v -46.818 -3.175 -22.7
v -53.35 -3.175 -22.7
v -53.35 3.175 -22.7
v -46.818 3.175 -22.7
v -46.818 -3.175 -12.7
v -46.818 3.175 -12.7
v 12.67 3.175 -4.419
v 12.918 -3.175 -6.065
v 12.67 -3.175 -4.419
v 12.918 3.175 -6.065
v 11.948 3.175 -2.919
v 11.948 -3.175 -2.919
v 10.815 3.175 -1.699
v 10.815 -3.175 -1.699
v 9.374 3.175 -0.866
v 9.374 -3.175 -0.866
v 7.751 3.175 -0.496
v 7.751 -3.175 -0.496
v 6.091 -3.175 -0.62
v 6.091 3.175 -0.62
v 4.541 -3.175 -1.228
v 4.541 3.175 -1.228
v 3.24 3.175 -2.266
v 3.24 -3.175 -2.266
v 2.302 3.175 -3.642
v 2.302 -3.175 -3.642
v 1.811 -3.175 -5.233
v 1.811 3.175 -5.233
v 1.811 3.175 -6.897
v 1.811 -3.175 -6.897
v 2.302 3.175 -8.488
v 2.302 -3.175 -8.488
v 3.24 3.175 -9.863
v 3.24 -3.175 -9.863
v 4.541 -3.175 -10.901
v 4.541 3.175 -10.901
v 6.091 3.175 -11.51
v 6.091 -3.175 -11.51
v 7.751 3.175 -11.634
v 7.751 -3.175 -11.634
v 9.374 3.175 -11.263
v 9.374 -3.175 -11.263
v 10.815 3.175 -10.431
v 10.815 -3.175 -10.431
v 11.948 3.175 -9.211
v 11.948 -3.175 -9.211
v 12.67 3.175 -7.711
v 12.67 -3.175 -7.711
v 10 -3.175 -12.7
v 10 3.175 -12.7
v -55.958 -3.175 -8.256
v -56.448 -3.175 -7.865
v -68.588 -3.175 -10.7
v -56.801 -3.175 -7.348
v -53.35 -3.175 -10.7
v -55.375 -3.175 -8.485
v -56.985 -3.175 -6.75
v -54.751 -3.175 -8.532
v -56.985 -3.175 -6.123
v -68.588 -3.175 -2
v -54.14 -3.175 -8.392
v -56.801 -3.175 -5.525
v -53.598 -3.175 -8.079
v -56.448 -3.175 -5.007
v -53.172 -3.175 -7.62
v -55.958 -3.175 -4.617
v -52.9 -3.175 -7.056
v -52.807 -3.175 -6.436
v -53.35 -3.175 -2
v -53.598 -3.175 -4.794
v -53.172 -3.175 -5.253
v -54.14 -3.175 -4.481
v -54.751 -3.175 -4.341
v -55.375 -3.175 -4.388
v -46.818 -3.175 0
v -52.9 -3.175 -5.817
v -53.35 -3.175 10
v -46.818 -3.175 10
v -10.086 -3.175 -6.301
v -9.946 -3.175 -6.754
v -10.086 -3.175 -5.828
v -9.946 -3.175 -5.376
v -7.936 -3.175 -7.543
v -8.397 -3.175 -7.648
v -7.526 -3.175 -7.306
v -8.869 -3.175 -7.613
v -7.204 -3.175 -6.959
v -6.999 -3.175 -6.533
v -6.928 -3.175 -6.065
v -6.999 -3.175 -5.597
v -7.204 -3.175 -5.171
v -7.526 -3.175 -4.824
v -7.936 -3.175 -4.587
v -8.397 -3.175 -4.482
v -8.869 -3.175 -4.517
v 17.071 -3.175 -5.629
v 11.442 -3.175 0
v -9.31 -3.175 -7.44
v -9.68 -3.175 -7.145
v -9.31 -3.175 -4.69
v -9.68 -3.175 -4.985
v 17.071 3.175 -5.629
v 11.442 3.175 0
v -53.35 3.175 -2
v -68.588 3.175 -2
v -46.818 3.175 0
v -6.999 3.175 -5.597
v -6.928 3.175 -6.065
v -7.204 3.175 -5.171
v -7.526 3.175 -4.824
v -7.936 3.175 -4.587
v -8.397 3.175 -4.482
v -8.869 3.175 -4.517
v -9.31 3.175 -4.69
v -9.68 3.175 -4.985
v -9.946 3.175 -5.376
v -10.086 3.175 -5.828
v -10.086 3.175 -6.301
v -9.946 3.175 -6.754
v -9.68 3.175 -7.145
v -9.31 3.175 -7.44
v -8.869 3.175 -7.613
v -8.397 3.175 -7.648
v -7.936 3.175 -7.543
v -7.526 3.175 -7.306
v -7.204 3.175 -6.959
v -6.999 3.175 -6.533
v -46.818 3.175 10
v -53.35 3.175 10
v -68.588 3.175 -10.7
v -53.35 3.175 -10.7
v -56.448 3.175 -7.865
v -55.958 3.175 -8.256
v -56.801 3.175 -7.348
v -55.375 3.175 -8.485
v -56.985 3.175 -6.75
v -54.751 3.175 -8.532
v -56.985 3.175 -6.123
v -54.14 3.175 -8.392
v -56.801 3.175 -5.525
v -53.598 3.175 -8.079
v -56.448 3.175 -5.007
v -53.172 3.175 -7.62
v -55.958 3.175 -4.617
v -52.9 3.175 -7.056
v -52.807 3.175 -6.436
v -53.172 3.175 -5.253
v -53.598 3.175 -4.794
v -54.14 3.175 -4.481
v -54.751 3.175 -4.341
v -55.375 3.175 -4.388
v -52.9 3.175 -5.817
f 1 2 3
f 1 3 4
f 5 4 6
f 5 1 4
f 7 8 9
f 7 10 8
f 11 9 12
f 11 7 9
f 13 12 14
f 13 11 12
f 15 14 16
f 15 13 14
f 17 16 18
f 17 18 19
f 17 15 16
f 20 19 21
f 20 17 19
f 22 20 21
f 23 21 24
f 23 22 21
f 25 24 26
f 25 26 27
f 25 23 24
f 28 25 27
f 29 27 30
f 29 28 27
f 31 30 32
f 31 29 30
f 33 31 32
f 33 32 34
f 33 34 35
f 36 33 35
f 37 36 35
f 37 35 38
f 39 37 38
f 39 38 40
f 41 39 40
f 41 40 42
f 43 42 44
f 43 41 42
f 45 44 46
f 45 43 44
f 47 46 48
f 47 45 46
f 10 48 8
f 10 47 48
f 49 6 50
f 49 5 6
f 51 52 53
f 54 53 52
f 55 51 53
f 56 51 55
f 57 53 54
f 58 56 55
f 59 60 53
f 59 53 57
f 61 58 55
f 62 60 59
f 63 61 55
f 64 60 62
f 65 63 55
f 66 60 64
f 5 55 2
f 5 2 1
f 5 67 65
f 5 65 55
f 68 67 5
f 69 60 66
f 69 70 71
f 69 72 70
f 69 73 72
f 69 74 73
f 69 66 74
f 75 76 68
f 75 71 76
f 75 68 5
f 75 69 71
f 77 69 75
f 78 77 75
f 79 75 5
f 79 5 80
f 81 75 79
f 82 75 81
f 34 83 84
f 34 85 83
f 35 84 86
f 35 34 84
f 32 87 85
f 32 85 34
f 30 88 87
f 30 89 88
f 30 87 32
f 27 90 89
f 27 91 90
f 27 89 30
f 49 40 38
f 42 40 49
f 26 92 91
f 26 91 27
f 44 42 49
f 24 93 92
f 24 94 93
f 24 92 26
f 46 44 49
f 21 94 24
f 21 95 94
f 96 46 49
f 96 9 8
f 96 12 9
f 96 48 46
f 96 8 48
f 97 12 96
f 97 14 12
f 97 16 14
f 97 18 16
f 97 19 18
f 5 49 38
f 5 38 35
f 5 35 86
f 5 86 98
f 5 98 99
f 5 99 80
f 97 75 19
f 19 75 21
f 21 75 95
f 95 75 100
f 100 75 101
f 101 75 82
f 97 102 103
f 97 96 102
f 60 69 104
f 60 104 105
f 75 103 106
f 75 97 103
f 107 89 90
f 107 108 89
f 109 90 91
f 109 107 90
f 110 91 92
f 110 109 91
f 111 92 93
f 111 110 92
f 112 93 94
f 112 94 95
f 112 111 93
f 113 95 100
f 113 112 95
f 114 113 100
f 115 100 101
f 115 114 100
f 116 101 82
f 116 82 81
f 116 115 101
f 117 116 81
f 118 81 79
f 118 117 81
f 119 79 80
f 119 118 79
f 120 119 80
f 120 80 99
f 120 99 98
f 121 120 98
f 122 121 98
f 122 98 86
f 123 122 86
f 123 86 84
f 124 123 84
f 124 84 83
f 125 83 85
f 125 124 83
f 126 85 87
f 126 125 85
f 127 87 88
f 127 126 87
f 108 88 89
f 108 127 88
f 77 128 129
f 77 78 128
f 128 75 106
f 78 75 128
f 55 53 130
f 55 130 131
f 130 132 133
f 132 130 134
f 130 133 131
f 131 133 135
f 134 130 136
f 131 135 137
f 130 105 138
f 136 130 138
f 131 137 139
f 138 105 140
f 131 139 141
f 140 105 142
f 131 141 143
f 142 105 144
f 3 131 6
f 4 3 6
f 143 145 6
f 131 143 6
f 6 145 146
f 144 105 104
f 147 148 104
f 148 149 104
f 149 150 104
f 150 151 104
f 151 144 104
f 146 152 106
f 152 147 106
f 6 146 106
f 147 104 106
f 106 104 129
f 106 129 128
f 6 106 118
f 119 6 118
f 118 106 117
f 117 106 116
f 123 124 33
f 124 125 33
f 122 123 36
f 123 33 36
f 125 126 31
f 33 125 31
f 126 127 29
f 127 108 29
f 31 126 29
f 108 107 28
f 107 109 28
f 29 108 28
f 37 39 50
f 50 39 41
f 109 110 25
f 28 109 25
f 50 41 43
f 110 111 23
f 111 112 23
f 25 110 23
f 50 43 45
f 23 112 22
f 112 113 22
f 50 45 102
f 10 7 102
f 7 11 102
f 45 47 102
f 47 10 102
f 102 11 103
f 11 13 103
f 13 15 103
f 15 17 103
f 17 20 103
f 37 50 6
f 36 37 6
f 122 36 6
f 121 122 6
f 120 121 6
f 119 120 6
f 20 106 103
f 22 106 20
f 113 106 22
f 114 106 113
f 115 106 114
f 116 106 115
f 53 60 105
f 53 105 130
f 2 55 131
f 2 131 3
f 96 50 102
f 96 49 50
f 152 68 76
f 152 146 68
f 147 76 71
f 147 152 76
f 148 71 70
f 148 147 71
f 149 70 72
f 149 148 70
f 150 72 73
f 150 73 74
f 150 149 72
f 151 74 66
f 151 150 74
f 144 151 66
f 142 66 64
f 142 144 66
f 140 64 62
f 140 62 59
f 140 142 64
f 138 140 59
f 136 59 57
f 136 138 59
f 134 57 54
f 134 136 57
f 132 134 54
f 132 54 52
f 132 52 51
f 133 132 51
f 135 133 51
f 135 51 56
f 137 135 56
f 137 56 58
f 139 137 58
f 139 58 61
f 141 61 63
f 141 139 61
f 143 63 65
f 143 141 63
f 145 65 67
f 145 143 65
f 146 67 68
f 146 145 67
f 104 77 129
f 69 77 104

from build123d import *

# Parameters (mm, degrees)
F0_R     = 2.101025
F0_R_2   = 1.5875
F0_R_3   = 5.584671
F1_DEPTH = 3.175


with BuildPart() as f1:
    # F0 (on Front) → F1 (new body, symmetric)
    with BuildSketch(Plane.XZ):
        Polygon((-46.817864, -12.7), (-46.817864, 0), (-46.817864, 10), (-53.349793, 10), (-53.349793, -2), (-68.587884, -2), (-68.587884, -10.7), (-53.349793, -10.7), (-53.349793, -22.7), (-46.817864, -22.7), align=None)
        with Locations((-54.907676, -6.436401)):
            Circle(F0_R, mode=Mode.SUBTRACT)
        Polygon((11.442136, 0), (1.442136, 0), (-46.817864, 0), (-46.817864, -12.7), (0, -12.7), (10, -12.7), (17.071068, -5.628932), align=None)
        with Locations((-8.515809, -6.064869)):
            Circle(F0_R_2, mode=Mode.SUBTRACT)
        with Locations((7.333491, -6.064869)):
            Circle(F0_R_3, mode=Mode.SUBTRACT)
    extrude(amount=F1_DEPTH, both=True)


solid = f1.part
